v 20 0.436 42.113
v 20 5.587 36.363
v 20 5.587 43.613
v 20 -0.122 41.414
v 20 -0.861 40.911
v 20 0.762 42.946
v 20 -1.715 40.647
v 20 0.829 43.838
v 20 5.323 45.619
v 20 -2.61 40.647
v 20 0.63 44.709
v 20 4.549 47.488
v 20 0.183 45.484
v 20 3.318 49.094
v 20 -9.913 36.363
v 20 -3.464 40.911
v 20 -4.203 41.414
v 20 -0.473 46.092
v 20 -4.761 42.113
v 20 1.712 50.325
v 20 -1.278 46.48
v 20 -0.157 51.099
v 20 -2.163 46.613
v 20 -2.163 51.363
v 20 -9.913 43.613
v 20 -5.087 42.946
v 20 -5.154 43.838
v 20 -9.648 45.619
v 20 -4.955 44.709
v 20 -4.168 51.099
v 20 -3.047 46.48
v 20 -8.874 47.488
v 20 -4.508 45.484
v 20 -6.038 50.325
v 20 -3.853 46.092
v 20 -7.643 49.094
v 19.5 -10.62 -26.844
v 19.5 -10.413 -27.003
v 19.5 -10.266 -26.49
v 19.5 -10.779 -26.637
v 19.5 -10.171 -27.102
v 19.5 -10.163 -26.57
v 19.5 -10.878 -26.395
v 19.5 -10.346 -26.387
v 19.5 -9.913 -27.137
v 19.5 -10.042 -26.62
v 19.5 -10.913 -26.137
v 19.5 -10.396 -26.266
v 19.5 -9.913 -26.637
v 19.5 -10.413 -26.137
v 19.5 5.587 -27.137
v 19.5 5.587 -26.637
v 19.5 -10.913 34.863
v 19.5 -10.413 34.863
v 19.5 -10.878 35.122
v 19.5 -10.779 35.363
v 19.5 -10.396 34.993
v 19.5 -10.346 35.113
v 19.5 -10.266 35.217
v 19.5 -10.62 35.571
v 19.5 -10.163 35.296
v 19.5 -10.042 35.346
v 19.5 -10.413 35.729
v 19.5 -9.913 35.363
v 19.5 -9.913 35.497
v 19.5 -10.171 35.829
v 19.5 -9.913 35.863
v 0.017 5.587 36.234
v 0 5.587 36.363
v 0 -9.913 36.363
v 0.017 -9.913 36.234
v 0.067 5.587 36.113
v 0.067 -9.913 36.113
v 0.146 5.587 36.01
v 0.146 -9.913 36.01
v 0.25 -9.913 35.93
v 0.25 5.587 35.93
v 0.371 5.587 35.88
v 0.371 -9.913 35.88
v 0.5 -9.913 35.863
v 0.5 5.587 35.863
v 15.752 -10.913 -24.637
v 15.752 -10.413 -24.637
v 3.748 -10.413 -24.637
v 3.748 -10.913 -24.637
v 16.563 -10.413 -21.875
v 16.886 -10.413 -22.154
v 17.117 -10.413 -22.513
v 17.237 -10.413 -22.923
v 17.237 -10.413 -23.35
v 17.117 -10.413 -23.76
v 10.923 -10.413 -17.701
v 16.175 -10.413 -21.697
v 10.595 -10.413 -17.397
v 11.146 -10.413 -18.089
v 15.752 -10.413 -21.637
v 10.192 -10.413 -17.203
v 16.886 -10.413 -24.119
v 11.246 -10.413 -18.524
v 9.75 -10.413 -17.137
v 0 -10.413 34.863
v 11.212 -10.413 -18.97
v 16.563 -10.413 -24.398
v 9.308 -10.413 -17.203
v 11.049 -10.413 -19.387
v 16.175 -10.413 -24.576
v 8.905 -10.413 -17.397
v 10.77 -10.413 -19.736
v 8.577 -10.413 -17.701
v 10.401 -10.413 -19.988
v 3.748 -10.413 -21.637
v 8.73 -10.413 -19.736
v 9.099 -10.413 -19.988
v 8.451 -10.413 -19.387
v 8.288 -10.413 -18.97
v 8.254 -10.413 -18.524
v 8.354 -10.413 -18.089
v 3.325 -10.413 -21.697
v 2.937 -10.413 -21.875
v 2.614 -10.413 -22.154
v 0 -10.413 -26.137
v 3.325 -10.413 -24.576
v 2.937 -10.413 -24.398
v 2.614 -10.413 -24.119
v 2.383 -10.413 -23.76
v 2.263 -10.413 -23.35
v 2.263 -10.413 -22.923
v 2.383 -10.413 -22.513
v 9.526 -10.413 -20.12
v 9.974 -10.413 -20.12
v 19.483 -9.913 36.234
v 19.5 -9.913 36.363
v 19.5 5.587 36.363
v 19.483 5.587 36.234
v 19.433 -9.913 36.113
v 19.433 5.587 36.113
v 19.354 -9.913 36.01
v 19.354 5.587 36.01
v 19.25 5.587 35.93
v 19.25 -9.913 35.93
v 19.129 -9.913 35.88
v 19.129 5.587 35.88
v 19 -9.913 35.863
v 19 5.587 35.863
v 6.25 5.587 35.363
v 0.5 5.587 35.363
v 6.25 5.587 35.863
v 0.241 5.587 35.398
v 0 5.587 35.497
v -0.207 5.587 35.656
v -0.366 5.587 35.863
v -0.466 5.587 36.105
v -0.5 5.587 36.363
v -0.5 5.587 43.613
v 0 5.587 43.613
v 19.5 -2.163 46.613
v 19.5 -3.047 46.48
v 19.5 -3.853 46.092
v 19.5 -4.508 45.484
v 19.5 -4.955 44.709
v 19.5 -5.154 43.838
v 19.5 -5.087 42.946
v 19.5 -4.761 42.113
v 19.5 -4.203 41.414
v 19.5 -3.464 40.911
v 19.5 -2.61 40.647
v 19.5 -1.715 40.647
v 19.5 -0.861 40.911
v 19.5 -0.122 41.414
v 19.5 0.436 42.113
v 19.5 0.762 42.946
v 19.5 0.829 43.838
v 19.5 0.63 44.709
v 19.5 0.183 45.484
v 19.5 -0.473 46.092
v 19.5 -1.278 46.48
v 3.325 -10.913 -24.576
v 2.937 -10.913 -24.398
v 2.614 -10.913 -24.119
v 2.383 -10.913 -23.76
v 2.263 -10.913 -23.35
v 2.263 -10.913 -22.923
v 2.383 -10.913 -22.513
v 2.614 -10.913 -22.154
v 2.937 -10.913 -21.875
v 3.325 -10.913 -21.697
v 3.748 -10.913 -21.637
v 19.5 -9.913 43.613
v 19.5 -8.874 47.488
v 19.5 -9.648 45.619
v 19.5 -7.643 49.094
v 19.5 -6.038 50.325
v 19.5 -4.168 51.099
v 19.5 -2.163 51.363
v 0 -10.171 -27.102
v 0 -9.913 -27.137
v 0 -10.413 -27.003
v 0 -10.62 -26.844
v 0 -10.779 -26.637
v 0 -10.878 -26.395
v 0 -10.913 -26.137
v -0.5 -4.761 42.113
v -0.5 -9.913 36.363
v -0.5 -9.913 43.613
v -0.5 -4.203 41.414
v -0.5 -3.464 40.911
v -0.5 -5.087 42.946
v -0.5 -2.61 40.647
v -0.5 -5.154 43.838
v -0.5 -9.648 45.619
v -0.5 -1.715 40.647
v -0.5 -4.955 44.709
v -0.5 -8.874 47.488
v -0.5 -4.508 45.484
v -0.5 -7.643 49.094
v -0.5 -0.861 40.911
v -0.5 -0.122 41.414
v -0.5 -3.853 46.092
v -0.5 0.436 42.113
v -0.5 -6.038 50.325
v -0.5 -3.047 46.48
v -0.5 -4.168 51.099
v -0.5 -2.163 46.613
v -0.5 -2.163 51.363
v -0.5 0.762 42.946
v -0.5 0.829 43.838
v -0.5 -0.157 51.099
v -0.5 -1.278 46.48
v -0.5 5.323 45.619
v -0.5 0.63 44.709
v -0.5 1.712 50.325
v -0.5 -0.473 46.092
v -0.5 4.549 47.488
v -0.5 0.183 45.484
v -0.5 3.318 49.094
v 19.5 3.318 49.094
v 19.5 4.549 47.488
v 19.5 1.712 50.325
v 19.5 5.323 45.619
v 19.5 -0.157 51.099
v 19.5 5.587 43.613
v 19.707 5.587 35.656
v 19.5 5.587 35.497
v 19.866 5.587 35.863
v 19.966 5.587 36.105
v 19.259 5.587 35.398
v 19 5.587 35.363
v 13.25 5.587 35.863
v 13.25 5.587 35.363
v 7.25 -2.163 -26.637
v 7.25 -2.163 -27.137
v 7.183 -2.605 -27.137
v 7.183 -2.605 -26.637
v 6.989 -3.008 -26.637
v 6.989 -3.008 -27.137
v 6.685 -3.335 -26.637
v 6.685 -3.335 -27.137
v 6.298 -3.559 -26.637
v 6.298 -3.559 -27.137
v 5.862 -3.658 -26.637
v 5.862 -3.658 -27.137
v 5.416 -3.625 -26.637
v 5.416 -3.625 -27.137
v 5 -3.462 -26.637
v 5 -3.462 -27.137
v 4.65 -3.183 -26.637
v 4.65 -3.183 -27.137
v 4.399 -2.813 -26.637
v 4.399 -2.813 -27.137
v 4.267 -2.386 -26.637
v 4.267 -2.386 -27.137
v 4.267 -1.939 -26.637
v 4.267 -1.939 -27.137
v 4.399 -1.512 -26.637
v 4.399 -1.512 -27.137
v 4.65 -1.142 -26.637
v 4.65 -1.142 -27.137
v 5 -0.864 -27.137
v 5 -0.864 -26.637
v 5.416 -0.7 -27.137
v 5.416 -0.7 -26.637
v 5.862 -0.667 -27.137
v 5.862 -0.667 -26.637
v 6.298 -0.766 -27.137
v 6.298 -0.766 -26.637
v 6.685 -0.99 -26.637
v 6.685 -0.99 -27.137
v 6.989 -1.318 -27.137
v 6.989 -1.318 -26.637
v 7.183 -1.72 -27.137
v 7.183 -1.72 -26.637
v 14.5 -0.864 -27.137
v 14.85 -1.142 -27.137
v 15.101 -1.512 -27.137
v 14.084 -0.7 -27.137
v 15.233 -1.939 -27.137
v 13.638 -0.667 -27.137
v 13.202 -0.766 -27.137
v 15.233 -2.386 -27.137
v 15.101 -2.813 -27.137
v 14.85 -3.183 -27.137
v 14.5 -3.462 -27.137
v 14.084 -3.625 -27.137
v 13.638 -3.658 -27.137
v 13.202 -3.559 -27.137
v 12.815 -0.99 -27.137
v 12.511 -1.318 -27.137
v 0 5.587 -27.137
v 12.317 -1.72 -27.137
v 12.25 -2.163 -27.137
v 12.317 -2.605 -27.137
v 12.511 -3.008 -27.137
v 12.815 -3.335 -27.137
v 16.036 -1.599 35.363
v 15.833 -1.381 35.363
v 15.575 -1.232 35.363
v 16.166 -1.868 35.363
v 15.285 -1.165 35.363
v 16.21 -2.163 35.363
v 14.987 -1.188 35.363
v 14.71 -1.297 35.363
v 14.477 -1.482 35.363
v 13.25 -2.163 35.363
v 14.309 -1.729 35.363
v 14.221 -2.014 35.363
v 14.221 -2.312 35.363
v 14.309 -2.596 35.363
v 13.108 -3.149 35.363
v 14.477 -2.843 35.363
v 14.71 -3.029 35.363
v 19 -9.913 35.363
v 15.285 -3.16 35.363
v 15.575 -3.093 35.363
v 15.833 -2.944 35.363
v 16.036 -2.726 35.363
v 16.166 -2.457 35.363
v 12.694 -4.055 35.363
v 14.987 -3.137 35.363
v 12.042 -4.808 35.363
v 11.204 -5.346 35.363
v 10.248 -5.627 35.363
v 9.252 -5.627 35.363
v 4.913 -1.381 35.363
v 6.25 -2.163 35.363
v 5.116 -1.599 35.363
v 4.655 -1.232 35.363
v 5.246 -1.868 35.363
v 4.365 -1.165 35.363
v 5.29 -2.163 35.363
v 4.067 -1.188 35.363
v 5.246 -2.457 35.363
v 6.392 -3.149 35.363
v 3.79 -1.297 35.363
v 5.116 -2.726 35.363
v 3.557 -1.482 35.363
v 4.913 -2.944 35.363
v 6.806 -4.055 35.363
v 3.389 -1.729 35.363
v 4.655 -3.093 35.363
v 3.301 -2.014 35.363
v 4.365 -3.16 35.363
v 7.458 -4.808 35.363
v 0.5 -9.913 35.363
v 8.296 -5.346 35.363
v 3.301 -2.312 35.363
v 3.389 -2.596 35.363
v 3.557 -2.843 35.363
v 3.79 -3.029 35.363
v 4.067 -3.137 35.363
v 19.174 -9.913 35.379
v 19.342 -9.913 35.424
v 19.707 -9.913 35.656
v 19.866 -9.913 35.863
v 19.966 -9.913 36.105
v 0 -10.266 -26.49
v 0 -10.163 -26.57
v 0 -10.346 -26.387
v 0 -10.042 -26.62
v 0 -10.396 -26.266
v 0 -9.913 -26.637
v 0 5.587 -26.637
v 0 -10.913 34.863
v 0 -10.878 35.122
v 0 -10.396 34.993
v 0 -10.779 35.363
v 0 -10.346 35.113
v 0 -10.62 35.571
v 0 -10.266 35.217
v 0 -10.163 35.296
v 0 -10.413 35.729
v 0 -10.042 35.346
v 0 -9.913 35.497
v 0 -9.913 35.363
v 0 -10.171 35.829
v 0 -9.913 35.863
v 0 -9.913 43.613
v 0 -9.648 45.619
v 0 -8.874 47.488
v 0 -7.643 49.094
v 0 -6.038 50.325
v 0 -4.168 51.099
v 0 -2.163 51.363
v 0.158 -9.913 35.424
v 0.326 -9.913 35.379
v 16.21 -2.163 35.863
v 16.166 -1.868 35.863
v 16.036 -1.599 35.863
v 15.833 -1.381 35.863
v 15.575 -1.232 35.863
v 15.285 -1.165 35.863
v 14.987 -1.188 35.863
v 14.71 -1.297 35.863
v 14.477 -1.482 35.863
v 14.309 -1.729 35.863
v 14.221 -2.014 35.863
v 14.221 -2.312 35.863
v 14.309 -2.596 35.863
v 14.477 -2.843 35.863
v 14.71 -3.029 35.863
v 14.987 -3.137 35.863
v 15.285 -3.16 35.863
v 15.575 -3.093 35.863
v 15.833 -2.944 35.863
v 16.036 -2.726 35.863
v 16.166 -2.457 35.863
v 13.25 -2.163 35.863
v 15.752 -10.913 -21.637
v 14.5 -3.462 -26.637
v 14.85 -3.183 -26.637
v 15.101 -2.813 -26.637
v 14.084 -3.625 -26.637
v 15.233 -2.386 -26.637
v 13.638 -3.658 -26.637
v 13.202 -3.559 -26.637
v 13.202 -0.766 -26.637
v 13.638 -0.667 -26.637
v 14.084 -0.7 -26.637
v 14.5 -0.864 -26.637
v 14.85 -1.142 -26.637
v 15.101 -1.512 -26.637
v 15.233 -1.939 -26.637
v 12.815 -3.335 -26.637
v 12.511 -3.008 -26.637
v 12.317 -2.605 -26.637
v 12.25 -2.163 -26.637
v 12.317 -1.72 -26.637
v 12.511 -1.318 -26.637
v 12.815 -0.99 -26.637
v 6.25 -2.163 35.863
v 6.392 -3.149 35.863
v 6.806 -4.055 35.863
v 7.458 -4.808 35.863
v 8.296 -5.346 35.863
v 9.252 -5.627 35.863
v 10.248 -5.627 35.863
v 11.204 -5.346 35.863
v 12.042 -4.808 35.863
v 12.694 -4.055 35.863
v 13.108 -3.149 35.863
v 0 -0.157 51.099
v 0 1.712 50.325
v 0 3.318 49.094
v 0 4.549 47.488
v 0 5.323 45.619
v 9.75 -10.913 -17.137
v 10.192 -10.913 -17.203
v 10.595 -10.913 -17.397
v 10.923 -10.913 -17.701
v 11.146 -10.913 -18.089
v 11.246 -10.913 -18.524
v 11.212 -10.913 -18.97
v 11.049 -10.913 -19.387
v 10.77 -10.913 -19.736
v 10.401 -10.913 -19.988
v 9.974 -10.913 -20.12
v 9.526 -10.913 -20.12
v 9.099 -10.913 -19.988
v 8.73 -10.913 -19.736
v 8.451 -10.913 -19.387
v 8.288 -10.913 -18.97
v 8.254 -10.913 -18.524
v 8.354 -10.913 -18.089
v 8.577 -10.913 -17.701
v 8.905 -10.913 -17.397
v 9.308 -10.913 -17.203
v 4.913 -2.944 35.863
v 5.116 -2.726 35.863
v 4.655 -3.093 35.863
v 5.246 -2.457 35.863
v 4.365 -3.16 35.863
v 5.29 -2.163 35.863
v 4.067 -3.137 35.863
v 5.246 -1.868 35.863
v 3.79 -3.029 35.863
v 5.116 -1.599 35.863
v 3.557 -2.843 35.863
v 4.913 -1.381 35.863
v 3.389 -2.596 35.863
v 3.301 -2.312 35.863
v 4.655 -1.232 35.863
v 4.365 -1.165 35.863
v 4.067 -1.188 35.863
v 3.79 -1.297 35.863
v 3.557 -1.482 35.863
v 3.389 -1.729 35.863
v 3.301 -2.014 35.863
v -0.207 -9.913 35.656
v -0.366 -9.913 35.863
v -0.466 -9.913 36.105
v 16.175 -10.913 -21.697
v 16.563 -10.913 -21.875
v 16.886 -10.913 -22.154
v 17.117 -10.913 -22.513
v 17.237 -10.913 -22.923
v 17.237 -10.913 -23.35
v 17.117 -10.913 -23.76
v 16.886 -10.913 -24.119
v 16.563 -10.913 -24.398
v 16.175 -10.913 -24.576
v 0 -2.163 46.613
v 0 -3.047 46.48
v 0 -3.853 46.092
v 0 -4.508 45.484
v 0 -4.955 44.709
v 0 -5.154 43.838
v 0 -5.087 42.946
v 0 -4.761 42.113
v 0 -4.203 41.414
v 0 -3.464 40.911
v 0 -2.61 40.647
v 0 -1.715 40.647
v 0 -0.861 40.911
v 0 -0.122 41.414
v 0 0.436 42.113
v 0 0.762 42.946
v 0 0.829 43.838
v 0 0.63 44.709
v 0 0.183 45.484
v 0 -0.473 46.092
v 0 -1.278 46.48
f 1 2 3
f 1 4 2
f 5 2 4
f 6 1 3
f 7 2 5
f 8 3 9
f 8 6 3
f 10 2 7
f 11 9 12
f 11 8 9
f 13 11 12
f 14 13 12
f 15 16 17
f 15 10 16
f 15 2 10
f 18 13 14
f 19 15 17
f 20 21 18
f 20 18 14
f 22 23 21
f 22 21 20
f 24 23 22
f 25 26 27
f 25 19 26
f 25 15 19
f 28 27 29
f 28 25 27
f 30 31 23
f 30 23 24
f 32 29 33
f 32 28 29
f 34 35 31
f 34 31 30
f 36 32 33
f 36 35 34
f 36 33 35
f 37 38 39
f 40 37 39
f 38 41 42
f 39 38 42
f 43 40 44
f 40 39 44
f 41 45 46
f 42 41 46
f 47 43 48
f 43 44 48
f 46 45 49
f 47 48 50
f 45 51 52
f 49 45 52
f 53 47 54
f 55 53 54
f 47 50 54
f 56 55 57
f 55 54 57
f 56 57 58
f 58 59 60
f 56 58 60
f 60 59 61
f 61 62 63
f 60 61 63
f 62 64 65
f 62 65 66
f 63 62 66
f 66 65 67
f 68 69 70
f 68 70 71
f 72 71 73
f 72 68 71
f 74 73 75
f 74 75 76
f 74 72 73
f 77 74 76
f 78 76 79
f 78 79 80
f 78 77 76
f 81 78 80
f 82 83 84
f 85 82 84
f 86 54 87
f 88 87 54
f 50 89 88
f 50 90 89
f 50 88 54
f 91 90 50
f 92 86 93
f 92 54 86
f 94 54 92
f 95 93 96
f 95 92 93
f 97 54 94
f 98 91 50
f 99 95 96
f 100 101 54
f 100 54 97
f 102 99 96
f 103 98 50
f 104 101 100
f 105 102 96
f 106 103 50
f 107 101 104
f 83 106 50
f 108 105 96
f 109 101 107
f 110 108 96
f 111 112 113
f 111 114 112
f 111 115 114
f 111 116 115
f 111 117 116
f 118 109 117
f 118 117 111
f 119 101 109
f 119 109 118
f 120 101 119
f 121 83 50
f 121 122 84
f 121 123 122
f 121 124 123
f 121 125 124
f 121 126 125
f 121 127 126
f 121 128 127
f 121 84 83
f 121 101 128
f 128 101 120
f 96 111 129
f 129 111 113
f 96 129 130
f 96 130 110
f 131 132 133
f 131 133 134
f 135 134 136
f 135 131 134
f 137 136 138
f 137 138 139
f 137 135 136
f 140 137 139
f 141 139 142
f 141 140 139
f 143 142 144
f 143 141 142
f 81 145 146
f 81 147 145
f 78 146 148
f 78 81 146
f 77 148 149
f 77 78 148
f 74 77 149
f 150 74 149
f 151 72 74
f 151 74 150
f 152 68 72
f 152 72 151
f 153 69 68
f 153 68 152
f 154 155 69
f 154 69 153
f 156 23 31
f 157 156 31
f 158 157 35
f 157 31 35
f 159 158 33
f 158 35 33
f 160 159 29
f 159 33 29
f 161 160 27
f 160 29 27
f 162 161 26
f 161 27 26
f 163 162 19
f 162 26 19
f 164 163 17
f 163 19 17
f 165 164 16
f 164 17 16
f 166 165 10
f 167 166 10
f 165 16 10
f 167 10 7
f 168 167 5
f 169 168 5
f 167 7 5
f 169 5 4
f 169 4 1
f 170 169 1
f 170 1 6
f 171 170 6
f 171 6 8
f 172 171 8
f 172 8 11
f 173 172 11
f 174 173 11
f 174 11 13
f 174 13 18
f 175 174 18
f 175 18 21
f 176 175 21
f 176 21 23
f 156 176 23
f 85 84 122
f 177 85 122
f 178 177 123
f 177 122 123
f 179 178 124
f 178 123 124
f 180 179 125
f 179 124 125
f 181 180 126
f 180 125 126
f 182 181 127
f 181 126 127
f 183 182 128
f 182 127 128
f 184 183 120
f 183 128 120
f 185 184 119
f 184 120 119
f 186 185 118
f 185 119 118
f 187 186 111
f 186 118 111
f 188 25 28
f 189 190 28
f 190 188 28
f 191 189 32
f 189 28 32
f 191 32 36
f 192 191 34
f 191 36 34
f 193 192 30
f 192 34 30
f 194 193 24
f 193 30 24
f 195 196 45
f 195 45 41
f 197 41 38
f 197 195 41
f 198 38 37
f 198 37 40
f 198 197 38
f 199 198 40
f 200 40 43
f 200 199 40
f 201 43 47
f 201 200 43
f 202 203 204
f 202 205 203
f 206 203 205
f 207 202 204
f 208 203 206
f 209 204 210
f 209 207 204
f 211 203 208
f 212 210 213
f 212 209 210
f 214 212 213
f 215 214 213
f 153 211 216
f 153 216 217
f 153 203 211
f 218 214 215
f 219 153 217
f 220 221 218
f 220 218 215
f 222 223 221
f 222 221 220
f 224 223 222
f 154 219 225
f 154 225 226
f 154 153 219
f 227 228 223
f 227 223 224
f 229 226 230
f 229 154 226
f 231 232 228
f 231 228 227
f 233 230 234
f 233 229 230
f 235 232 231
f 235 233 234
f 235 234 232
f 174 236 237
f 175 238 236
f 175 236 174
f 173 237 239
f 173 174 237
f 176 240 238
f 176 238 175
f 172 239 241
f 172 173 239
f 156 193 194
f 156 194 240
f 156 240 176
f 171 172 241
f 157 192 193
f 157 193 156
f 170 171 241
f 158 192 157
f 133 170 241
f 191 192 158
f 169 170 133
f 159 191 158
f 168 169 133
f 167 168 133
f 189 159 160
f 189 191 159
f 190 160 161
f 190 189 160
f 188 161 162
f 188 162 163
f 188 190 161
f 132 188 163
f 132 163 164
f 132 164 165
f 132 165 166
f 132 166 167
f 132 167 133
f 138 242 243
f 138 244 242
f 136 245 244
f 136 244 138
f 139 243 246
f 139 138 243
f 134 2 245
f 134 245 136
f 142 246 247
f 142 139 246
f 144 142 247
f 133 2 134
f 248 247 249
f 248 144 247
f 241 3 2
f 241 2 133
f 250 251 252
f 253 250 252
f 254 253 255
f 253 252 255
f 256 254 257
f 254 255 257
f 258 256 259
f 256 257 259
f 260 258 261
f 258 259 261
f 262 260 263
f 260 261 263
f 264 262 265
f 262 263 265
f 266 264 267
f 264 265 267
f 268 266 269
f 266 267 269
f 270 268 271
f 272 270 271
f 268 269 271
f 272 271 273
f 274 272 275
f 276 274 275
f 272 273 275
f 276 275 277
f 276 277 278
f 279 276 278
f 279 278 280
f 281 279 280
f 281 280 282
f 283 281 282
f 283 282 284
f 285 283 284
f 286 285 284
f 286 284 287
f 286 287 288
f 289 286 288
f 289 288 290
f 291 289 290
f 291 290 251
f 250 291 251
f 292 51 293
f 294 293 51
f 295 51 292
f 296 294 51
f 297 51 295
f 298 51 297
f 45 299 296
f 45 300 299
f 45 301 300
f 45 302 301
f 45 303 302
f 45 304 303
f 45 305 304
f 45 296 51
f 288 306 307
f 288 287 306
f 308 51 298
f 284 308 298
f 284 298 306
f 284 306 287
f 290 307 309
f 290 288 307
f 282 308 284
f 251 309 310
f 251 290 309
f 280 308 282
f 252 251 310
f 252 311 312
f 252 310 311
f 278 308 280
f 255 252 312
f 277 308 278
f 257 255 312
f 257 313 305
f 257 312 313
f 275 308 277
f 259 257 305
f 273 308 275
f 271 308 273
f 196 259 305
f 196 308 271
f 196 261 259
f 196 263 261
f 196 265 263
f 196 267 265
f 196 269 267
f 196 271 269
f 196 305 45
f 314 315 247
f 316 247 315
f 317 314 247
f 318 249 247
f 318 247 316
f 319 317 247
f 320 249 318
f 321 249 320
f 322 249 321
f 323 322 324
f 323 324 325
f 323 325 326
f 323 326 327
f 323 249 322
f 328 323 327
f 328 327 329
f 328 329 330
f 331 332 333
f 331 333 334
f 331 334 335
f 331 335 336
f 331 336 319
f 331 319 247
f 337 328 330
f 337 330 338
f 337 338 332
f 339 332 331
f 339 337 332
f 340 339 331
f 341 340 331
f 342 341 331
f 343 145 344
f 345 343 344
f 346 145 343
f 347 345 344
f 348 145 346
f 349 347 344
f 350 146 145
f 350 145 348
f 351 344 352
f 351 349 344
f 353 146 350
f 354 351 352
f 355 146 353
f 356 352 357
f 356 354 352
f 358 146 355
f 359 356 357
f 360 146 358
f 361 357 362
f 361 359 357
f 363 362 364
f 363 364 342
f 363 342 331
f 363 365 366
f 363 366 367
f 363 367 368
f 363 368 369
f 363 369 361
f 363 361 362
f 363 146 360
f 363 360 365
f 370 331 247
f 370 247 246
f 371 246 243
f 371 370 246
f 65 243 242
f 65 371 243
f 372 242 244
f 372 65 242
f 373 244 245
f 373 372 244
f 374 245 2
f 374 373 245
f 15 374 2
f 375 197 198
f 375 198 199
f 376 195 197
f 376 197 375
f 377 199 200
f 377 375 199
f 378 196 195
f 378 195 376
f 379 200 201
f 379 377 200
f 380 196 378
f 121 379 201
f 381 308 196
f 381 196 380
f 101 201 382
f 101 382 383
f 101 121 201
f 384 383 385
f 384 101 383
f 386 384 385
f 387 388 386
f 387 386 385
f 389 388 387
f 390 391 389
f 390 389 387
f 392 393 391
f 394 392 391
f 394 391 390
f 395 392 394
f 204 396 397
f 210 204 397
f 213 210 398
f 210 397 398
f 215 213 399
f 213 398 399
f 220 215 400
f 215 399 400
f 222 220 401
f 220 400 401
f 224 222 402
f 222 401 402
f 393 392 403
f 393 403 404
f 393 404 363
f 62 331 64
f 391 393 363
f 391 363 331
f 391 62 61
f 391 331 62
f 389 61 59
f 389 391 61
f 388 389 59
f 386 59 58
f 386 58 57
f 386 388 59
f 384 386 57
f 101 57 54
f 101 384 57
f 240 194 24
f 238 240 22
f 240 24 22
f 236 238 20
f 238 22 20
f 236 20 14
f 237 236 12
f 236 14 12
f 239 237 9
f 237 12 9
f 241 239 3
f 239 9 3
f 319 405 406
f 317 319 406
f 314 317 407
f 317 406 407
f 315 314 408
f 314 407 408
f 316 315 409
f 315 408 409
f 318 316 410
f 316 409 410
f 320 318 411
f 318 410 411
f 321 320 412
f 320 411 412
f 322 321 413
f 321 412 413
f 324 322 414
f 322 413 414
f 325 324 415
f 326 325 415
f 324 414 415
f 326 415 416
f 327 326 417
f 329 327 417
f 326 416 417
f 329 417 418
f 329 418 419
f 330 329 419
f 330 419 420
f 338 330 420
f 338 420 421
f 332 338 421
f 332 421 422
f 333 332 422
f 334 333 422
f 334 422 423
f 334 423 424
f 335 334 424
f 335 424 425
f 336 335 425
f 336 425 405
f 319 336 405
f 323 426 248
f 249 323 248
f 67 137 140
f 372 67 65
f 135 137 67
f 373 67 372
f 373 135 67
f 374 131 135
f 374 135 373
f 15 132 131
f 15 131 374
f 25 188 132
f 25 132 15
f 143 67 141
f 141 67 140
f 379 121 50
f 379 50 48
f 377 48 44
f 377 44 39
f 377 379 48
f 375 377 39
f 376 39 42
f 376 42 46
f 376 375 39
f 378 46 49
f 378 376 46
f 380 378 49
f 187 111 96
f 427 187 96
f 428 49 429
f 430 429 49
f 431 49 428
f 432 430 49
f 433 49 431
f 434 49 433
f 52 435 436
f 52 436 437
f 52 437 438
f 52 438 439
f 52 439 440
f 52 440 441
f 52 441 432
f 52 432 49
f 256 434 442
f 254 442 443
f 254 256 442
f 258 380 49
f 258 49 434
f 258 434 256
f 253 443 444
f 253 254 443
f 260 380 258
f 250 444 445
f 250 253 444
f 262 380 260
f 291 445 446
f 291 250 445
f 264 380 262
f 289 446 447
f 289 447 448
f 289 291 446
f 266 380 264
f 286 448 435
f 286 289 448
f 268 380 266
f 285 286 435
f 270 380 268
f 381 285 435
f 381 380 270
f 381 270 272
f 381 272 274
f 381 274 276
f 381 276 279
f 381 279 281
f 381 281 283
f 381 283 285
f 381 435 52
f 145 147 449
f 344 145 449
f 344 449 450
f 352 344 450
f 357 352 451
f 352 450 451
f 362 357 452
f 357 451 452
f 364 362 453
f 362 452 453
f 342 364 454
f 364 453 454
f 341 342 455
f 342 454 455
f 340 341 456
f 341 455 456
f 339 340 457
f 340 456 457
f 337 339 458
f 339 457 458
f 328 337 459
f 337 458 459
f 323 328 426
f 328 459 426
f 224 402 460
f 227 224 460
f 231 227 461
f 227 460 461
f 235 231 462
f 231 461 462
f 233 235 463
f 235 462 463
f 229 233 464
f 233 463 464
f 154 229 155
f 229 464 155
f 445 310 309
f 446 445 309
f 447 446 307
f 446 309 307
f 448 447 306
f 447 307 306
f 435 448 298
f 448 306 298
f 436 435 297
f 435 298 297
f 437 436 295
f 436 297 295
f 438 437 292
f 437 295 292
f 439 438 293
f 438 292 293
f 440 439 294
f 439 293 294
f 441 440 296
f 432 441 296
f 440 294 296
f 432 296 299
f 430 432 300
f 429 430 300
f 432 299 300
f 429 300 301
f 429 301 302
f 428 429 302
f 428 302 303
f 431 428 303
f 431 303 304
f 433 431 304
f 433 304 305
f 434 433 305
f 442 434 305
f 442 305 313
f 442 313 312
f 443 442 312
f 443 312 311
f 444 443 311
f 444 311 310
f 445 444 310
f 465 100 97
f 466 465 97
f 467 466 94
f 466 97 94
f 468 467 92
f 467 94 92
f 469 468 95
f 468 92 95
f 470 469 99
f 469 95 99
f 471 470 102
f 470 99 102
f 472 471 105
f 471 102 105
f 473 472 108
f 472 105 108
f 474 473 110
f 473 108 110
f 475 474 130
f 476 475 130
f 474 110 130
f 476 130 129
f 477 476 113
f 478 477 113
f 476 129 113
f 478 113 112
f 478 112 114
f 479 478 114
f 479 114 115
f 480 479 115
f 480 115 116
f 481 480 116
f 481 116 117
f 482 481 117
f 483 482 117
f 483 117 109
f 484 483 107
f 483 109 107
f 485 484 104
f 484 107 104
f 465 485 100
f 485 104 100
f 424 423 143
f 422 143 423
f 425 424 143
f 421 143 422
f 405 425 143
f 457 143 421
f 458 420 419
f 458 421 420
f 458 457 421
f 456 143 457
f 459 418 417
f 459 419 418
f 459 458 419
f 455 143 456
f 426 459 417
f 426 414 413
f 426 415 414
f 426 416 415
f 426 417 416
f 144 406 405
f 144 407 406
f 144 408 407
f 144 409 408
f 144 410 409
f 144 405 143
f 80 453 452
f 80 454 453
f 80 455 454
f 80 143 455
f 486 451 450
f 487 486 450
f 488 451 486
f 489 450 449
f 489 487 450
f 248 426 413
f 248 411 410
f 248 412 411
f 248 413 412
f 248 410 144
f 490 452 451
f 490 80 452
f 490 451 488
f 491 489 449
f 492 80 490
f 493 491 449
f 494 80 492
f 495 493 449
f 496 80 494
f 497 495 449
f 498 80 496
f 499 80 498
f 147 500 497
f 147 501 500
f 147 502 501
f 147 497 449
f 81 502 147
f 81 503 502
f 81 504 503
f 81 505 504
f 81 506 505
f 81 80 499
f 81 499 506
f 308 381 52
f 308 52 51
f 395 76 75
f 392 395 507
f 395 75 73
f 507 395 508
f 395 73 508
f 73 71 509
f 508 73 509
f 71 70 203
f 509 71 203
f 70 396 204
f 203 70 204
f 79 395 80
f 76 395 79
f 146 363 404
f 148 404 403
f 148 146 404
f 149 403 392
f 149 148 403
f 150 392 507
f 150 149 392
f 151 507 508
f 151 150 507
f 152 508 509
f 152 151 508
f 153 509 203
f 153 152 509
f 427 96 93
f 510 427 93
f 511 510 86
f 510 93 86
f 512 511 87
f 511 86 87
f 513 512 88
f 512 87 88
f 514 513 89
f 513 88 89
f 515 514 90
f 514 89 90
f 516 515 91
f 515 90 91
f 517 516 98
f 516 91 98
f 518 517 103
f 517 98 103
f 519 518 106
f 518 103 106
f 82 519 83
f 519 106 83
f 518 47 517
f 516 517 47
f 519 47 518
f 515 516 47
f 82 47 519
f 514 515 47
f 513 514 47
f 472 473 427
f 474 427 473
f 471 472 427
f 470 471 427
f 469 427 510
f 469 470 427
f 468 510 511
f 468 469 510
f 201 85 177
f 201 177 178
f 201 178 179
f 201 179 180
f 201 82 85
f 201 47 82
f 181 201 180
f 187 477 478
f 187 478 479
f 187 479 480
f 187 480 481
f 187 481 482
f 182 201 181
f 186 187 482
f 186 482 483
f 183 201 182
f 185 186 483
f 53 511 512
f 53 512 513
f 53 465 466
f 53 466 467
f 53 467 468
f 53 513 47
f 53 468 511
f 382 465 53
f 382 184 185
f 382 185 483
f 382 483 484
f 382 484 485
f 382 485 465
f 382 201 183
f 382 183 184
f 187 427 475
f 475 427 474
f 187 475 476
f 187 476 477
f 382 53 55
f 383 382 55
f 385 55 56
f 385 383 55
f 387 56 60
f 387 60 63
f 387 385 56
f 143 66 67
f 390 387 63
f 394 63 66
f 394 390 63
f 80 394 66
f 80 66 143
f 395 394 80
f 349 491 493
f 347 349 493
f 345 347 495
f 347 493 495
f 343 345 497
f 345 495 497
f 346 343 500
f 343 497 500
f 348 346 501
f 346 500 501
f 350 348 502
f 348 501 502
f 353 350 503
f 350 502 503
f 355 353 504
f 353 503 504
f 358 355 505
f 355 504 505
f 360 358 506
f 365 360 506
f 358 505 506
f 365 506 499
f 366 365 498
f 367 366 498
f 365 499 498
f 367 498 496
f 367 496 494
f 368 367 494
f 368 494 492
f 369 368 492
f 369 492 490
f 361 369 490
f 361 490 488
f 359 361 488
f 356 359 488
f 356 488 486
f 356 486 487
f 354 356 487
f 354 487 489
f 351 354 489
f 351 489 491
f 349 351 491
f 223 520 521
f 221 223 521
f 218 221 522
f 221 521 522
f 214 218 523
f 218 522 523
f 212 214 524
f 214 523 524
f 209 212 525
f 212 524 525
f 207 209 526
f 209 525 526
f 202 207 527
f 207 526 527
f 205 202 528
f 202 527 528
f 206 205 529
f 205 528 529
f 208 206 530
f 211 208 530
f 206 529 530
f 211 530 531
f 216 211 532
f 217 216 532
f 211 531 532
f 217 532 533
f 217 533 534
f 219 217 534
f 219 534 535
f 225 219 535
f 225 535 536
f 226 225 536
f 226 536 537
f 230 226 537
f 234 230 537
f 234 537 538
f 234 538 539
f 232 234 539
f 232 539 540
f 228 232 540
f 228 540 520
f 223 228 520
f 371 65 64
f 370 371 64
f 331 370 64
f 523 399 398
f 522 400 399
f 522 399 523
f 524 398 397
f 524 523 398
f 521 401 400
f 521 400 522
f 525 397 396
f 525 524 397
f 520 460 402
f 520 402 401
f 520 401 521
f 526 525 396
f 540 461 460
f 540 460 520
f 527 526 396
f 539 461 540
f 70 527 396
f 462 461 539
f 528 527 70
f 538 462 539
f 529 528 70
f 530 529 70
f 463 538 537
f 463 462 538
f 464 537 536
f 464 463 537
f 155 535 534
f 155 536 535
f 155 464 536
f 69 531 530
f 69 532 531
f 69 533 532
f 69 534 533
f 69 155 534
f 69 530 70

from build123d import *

# Parameters (mm, degrees)
BRIDA_BASE1_DEPTH                  = 19.5
BRIDA_DE_ARISTA1_STRIP_W           = 3
BRIDA_DE_ARISTA1_STRIP_H           = 0.5
BRIDA_DE_ARISTA1_STRIP_CUT_DEPTH   = 15.5
BRIDA_DE_ARISTA1_STRIP_2_W         = 3
BRIDA_DE_ARISTA1_STRIP_2_H         = 0.5
BRIDA_DE_ARISTA1_STRIP_CUT_2_DEPTH = 15.5
BRIDA_DE_ARISTA1_DEPTH             = 15.5
BRIDA_DE_ARISTA1_BEND_DEPTH        = 15.5
CROQUIS11_R                        = 3
CORTAR_EXTRUIR1_DEPTH              = 57.369658542
CROQUIS14_R                        = 1
CORTAR_EXTRUIR2_DEPTH              = 10
CROQUIS15_R                        = 1.5
CORTAR_EXTRUIR3_DEPTH              = 10
CROQUIS16_R                        = 1.5
CORTAR_EXTRUIR4_DEPTH              = 0.5


# Sheet-metal steps are written as plain solids
with BuildPart() as part:
    # Croquis1 → Brida base1 (new body)
    with BuildSketch(Plane(origin=(0, 0, 0), x_dir=(0, 0, -1), z_dir=(1, 0, 0))):
        with BuildLine():
            Line((-35.363451777, 5.587428088), (-35.363451777, -9.912571912))
            ThreePointArc((-35.363451777, -9.912571912), (-35.217005167, -10.266125303), (-34.863451777, -10.412571912))
            Line((-34.863451777, -10.412571912), (26.136548223, -10.412571912))
            ThreePointArc((26.136548223, -10.412571912), (26.490101614, -10.266125303), (26.636548223, -9.912571912))
            Line((26.636548223, -9.912571912), (26.636548223, 5.587428088))
            Line((26.636548223, 5.587428088), (27.136548223, 5.587428088))
            Line((27.136548223, 5.587428088), (27.136548223, -9.912571912))
            ThreePointArc((27.136548223, -9.912571912), (26.843655005, -10.619678693), (26.136548223, -10.912571912))
            Line((26.136548223, -10.912571912), (-34.863451777, -10.912571912))
            ThreePointArc((-34.863451777, -10.912571912), (-35.570558558, -10.619678693), (-35.863451777, -9.912571912))
            Line((-35.863451777, -9.912571912), (-35.863451777, 5.587428088))
            Line((-35.863451777, 5.587428088), (-35.363451777, 5.587428088))
        make_face()
    extrude(amount=BRIDA_BASE1_DEPTH)

    # Brida de arista1 strip (across the edge) → Brida de arista1 strip cut (cut)
    with BuildSketch(Plane(origin=(19.5, -9.912571912, 35.863451777), x_dir=(-1, 0, 0), z_dir=(0, 1, 0))):
        with Locations((-1, -0.25)):
            Rectangle(BRIDA_DE_ARISTA1_STRIP_W, BRIDA_DE_ARISTA1_STRIP_H)
    extrude(amount=BRIDA_DE_ARISTA1_STRIP_CUT_DEPTH, mode=Mode.SUBTRACT)

    # Brida de arista1 strip 2 (across the edge) → Brida de arista1 strip cut 2 (cut)
    with BuildSketch(Plane(origin=(0, 5.587428088, 35.863451777), x_dir=(1, 0, 0), z_dir=(0, -1, 0))):
        with Locations((-1, -0.25)):
            Rectangle(BRIDA_DE_ARISTA1_STRIP_2_W, BRIDA_DE_ARISTA1_STRIP_2_H)
    extrude(amount=BRIDA_DE_ARISTA1_STRIP_CUT_2_DEPTH, mode=Mode.SUBTRACT)

    # Brida de arista1 section (across the edge) → Brida de arista1 (add)
    with BuildSketch(Plane(origin=(19.5, -9.912571912, 35.863451777), x_dir=(-1, 0, 0), z_dir=(0, 1, 0))):
        with BuildLine():
            Line((-0.5, 0.5), (-0.5, 15.5))
            Line((-0.5, 15.5), (0, 15.5))
            Line((0, 15.5), (0, 0.5))
            ThreePointArc((0, 0.5), (0.146446609, 0.146446609), (0.5, 0))
            Line((0.5, 0), (0.5, -0.5))
            ThreePointArc((0.5, -0.5), (-0.207106781, -0.207106781), (-0.5, 0.5))
        make_face()
    extrude(amount=BRIDA_DE_ARISTA1_DEPTH)

    # Brida de arista1 section 2 (across the edge) → Brida de arista1 bend (add)
    with BuildSketch(Plane(origin=(0, 5.587428088, 35.863451777), x_dir=(1, 0, 0), z_dir=(0, -1, 0))):
        with BuildLine():
            Line((-0.5, 0.5), (-0.5, 15.5))
            Line((-0.5, 15.5), (0, 15.5))
            Line((0, 15.5), (0, 0.5))
            ThreePointArc((0, 0.5), (0.146446609, 0.146446609), (0.5, 0))
            Line((0.5, 0), (0.5, -0.5))
            ThreePointArc((0.5, -0.5), (-0.207106781, -0.207106781), (-0.5, 0.5))
        make_face()
    extrude(amount=BRIDA_DE_ARISTA1_BEND_DEPTH)

    # Croquis11 → Cortar-Extruir1 (cut, through all)
    with BuildSketch(Plane(origin=(20, 0, 0), x_dir=(0, 0, -1), z_dir=(1, 0, 0))):
        with Locations(Location((-43.613451777, -2.162571912, 0), (0, 0, 180))):
            Circle(CROQUIS11_R)
        with BuildLine():
            ThreePointArc((-43.613451777, -9.912571912), (-49.093529331, -7.642649466), (-51.363451777, -2.162571912))
            Line((-51.363451777, -2.162571912), (-51.363451777, -9.912571912))
            Line((-51.363451777, -9.912571912), (-43.613451777, -9.912571912))
        make_face()
        with BuildLine():
            ThreePointArc((-51.363451777, -2.162571912), (-49.093529331, 3.317505642), (-43.613451777, 5.587428088))
            Line((-43.613451777, 5.587428088), (-51.363451777, 5.587428088))
            Line((-51.363451777, 5.587428088), (-51.363451777, -2.162571912))
        make_face()
    extrude(amount=-CORTAR_EXTRUIR1_DEPTH, mode=Mode.SUBTRACT)

    # Croquis14 → Cortar-Extruir2 (cut)
    with BuildSketch(Plane.XY.offset(35.863451777)):
        with Locations((15.21, -2.162571912)):
            Circle(CROQUIS14_R)
        with Locations((4.29, -2.162571912)):
            Circle(CROQUIS14_R)
        with BuildLine():
            Line((6.25, 5.587428088), (6.25, -2.162571912))
            ThreePointArc((6.25, -2.162571912), (9.75, -5.662571912), (13.25, -2.162571912))
            Line((13.25, -2.162571912), (13.25, 5.587428088))
            Line((13.25, 5.587428088), (6.25, 5.587428088))
        make_face()
    extrude(amount=-CORTAR_EXTRUIR2_DEPTH, mode=Mode.SUBTRACT)

    # Croquis15 → Cortar-Extruir3 (cut)
    with BuildSketch(Plane(origin=(0, 0, -27.136548223), x_dir=(-1, 0, 0), z_dir=(0, 0, -1))):
        with Locations((-13.75, -2.162571912)):
            Circle(CROQUIS15_R)
        with Locations(Location((-5.75, -2.162571912, 0), (0, 0, 180))):
            Circle(CROQUIS15_R)
    extrude(amount=-CORTAR_EXTRUIR3_DEPTH, mode=Mode.SUBTRACT)

    # Croquis16 → Cortar-Extruir4 (cut)
    with BuildSketch(Plane(origin=(0, -10.412571912, 0), x_dir=(-1, 0, 0), z_dir=(0, 1, 0))):
        with Locations(Location((-9.75, -18.636548223, 0), (0, 0, 90))):
            Circle(CROQUIS16_R)
        with BuildLine():
            Line((-3.747619635, -21.636548223), (-15.752380365, -21.636548223))
            ThreePointArc((-15.752380365, -21.636548223), (-17.252380365, -23.136548223), (-15.752380365, -24.636548223))
            Line((-15.752380365, -24.636548223), (-3.747619635, -24.636548223))
            ThreePointArc((-3.747619635, -24.636548223), (-2.247619635, -23.136548223), (-3.747619635, -21.636548223))
        make_face()
    extrude(amount=-CORTAR_EXTRUIR4_DEPTH, mode=Mode.SUBTRACT)


solid = part.part
